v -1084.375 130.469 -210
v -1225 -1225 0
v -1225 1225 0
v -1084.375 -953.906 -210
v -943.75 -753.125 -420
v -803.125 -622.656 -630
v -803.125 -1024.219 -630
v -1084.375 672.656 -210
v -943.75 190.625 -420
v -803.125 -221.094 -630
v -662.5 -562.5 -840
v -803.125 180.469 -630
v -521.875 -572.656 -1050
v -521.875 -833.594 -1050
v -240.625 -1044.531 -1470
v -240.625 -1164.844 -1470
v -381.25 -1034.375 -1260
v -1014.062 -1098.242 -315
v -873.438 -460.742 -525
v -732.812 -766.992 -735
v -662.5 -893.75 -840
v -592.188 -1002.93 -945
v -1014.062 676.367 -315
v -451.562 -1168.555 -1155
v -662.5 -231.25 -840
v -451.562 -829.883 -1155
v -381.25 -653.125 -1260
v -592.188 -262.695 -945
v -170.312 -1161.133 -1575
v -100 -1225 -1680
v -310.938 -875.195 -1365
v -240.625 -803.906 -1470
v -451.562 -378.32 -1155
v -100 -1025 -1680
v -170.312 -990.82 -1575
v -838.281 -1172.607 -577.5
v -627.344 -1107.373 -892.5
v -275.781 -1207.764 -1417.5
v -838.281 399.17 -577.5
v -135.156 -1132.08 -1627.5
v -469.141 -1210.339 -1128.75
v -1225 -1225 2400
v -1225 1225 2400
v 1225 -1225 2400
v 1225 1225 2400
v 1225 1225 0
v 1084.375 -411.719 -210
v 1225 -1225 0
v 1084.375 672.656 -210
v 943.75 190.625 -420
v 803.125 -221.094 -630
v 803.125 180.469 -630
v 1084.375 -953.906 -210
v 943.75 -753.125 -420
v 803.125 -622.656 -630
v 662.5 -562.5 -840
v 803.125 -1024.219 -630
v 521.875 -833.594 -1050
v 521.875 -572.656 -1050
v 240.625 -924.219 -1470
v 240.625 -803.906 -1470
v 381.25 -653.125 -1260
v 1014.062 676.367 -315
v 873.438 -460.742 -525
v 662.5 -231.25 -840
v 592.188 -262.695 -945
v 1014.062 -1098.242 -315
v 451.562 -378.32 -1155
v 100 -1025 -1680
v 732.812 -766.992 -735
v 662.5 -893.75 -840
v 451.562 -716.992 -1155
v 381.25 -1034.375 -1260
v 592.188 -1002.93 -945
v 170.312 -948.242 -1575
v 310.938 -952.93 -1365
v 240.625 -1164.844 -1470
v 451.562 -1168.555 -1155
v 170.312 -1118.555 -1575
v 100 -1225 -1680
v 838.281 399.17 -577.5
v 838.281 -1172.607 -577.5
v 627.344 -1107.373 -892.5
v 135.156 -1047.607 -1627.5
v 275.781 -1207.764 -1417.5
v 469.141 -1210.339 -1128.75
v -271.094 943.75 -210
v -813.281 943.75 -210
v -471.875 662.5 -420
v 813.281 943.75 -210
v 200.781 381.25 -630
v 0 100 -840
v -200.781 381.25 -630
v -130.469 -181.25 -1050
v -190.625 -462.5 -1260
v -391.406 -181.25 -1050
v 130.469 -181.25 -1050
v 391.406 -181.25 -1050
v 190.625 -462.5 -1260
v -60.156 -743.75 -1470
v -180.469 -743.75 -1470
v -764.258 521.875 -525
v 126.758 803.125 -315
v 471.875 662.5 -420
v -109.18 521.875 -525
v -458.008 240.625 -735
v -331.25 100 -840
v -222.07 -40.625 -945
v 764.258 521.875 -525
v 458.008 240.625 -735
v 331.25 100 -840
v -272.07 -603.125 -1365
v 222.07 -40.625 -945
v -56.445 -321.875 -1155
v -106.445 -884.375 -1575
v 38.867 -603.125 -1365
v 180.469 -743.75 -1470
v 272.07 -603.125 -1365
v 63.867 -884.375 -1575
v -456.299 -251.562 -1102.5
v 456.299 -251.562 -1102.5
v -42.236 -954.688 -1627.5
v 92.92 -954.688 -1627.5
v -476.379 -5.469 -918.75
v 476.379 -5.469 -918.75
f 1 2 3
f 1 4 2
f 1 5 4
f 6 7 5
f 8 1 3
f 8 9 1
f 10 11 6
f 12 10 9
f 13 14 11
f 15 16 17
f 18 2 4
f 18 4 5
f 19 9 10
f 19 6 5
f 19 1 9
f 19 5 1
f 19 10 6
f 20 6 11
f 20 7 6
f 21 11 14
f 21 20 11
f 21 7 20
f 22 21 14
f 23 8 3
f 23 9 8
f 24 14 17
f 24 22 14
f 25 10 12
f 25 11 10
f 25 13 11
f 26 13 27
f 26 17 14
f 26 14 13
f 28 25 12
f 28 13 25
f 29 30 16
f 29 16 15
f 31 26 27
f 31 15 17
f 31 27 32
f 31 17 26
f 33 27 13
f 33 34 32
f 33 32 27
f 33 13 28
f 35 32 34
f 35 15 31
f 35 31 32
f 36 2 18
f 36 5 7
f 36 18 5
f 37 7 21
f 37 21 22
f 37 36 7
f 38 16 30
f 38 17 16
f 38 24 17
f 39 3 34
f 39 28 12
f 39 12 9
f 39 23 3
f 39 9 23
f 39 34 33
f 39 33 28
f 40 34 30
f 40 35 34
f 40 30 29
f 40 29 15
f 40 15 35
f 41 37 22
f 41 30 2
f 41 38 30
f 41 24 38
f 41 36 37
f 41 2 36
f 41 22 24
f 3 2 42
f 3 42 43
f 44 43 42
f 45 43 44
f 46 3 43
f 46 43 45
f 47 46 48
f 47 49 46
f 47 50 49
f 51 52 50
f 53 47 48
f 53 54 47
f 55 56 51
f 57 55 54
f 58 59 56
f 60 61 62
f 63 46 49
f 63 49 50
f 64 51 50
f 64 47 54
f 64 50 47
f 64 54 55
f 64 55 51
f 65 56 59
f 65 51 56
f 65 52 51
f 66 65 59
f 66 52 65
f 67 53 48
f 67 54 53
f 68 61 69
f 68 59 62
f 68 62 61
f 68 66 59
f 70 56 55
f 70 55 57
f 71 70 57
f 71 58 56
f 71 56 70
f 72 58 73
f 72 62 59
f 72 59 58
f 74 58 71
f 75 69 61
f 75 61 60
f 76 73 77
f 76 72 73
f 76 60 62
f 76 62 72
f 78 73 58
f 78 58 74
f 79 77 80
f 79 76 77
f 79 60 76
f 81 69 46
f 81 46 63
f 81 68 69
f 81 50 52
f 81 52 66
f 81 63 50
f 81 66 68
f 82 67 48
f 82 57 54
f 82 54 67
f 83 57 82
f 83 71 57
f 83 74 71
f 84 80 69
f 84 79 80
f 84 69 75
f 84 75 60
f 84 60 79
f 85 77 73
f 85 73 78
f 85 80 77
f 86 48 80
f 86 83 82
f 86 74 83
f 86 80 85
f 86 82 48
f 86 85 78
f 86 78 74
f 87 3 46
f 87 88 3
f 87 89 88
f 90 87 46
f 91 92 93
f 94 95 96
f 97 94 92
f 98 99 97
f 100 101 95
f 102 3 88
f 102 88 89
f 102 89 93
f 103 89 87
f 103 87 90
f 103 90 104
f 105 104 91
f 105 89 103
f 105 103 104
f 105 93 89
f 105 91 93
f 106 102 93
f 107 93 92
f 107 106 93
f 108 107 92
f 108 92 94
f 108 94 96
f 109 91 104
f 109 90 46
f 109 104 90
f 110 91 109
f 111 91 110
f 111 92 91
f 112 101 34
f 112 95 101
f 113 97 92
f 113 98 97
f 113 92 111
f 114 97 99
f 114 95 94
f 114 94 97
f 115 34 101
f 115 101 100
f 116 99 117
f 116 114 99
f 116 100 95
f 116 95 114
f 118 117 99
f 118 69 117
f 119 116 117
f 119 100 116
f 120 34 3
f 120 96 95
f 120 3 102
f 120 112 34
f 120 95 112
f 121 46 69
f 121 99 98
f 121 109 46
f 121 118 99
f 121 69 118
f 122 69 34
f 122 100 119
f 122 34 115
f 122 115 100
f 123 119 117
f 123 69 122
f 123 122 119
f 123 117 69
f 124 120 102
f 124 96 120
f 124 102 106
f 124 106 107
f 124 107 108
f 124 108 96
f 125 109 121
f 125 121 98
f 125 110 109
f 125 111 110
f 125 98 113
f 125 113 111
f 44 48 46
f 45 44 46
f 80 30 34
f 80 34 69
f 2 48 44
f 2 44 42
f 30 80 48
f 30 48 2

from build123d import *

# Parameters (mm, degrees)
F0_W      = 2450
F0_H      = 2450
F1_DEPTH  = 2400
F1_FACE_W = 2450
F1_FACE_H = 2450
F3_W      = 200
F3_H      = 200
F5_DEPTH  = 400
F5_FACE_W = 2450
F5_FACE_H = 2450
F6_DEPTH  = 400


with BuildPart() as f1:
    # F0 (on Top) → F1 (new body)
    with BuildSketch(Plane.XY):
        Rectangle(F0_W, F0_H)
    extrude(amount=F1_DEPTH)

    # F1_face (on face) → F4 section 0
    with BuildSketch(Plane(origin=(0, 0, 0), x_dir=(1, 0, 0), z_dir=(0, 0, -1))):
        Rectangle(F1_FACE_W, F1_FACE_H)
    # F3 (on offset) → F4 section 1
    with BuildSketch(Plane(origin=(0, 0, -1680), x_dir=(1, 0, 0), z_dir=(0, 0, -1))):
        with Locations((0, 1125)):
            Rectangle(F3_W, F3_H)
    loft()


with BuildPart() as f5:
    # F1_face (on face) → F5 (new body)
    with BuildSketch(Plane(origin=(0, 0, 0), x_dir=(1, 0, 0), z_dir=(0, 0, -1))):
        Rectangle(F1_FACE_W, F1_FACE_H)
    extrude(amount=F5_DEPTH)


with BuildPart() as f6:
    # F5_face (on face) → F6 (new body)
    with BuildSketch(Plane(origin=(0, 0, -400), x_dir=(1, 0, 0), z_dir=(0, 0, -1))):
        Rectangle(F5_FACE_W, F5_FACE_H)
    extrude(amount=F6_DEPTH)


solid = f1.part
